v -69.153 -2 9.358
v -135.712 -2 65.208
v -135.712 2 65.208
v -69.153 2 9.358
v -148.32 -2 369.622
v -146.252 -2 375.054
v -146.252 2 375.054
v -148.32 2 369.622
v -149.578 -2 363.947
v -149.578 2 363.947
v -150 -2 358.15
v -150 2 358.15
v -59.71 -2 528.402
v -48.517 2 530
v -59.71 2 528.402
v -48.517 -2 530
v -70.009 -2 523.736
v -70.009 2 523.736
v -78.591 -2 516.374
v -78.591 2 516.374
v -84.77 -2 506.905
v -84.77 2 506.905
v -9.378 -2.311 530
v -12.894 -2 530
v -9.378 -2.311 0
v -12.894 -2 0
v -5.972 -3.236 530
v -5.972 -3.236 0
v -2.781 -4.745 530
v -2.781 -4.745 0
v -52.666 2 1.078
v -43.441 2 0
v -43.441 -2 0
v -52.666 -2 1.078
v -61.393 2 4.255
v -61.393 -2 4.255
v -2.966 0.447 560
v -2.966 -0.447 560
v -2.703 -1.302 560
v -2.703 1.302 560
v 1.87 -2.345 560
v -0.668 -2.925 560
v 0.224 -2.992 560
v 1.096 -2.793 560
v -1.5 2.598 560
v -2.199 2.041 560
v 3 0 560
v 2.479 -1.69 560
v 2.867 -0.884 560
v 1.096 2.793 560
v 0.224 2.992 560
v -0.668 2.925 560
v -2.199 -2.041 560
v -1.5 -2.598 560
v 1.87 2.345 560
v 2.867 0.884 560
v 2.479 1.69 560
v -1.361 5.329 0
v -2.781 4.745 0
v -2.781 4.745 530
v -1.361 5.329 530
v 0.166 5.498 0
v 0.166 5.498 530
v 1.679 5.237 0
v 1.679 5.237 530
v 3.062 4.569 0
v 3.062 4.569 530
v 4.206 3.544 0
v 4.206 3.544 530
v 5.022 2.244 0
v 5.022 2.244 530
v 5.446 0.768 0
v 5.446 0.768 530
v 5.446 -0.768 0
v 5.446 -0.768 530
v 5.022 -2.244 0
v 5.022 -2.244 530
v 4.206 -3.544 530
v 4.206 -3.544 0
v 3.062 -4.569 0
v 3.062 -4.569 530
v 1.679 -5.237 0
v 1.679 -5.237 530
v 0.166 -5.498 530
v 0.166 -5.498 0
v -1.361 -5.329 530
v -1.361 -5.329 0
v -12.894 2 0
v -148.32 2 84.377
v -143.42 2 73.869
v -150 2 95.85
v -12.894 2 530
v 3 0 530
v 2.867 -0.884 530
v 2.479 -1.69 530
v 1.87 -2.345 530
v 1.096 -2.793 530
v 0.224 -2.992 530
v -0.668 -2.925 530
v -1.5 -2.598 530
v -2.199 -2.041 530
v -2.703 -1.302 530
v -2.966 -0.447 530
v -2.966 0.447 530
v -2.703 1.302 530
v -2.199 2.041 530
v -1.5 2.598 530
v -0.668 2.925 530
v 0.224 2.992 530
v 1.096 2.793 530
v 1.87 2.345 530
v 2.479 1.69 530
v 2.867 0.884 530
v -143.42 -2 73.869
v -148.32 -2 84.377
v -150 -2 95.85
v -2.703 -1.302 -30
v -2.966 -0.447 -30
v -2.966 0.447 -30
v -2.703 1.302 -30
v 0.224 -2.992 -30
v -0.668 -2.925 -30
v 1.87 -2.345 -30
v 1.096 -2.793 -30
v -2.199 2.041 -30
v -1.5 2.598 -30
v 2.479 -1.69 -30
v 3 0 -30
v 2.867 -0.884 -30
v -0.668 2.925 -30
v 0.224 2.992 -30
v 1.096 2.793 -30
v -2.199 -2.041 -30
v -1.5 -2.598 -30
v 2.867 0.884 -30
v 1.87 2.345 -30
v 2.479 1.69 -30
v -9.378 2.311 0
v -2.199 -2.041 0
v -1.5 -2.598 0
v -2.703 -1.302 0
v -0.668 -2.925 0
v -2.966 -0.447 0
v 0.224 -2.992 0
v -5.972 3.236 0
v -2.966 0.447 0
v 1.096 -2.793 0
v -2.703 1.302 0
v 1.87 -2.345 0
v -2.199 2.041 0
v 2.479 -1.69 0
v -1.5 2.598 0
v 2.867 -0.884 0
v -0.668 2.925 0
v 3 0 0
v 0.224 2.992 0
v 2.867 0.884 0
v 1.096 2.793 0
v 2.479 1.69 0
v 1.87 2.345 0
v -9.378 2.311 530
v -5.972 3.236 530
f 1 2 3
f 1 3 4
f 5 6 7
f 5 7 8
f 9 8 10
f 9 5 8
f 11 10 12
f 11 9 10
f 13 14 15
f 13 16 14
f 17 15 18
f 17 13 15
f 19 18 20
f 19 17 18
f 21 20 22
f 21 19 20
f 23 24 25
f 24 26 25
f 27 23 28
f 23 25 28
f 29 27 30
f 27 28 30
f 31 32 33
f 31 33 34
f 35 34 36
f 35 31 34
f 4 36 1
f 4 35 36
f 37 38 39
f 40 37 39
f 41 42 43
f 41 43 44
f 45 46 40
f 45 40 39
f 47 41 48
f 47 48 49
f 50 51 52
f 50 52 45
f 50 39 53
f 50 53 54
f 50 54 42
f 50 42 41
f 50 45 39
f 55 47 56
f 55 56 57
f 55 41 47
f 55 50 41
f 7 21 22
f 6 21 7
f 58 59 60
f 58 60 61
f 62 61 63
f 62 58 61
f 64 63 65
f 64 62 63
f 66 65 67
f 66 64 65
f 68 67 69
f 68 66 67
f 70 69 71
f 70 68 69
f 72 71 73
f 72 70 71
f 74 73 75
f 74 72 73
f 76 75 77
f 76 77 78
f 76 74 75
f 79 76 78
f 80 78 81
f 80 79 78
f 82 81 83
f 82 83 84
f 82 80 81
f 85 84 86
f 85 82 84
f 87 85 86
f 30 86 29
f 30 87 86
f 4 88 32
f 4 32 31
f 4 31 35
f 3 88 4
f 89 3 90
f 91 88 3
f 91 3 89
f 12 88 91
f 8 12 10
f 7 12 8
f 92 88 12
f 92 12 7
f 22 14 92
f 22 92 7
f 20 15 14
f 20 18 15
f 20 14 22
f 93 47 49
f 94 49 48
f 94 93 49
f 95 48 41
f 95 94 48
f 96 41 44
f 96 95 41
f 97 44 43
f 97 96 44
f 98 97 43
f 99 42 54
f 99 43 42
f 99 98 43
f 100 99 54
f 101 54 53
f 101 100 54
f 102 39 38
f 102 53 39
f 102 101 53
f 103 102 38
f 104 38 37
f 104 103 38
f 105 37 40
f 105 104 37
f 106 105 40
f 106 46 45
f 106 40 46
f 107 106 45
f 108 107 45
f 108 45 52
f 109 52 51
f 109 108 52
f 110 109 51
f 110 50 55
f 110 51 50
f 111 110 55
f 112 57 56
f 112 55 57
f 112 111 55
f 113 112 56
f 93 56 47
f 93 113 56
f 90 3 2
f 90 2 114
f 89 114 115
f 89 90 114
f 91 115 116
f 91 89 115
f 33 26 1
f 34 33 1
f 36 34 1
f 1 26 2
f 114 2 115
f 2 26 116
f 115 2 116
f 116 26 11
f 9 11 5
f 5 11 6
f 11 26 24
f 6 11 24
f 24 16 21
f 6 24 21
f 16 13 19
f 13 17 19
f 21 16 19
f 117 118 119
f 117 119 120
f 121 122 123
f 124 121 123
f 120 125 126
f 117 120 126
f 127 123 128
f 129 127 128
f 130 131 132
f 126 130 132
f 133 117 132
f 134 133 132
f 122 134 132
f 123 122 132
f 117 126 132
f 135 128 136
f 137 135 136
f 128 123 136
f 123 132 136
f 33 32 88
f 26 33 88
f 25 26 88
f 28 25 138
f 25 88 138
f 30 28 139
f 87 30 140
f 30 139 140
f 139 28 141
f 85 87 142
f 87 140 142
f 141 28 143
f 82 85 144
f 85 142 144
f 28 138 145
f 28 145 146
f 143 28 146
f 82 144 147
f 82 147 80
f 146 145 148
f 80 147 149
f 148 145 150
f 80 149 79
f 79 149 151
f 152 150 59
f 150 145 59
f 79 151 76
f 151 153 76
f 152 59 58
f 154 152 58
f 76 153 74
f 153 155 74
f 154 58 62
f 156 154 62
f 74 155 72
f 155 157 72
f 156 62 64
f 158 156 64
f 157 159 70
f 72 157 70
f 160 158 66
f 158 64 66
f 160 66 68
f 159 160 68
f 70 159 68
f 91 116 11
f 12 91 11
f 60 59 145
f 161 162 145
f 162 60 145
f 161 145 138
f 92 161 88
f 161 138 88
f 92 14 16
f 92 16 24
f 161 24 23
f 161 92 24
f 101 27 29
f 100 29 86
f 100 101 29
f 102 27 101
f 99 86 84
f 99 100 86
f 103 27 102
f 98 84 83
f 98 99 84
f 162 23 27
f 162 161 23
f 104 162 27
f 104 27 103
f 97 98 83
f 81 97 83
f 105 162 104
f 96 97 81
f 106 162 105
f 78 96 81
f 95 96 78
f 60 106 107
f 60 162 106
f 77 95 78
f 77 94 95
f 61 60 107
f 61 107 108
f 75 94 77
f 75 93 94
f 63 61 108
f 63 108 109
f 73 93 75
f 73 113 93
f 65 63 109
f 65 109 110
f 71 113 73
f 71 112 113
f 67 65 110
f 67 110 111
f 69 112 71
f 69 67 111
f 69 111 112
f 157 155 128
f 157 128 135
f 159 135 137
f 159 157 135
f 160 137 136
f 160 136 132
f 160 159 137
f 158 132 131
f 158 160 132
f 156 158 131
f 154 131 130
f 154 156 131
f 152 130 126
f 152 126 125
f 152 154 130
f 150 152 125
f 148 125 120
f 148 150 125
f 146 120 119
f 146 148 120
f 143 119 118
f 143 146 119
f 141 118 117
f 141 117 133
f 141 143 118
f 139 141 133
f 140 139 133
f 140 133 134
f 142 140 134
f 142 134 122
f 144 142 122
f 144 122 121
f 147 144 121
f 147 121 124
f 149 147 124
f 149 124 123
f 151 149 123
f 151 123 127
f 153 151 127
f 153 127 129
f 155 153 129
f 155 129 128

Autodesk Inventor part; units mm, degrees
ref_plane "YZ Plane" through (0, 0, 0) normal (1, 0, 0) x (0, 1, 0)
ref_plane "XZ Plane" through (0, 0, 0) normal (0, 1, 0) x (-1, 0, 0)
ref_plane "XY Plane" through (0, 0, 0) normal (0, 0, 1) x (1, 0, 0)
sketch "Sketch1" plane through (0, 0, 0) normal (0, 0, 1) x (1, 0, 0)
  circle A0 centre (0, 0) radius 5.5
  circle A1 centre (0, 0) radius 3
  dimension "d0" = 11
  dimension "d1" = 6
extrude "tube" add sketch "Sketch1" along normal blind 530
sketch "Sketch2" plane through (0, 0, 0) normal (0, 1, 0) x (-1, 0, 0)
  line L0 (0, 0) -> (150, 0)
  line L1 (150, 0) -> (150, 530)
  line L2 (150, 530) -> (0, 530)
  line L3 (0, 530) -> (0, 0)
  line L4 (75, 0) -> (165.4178, 0) construction
  line L5 (74, 530) -> (150, 367.0175)
  line L6 (74, 530) -> (253.8313, 530) construction
  line L7 (150, 77.1972) -> (58, 0)
  point P0 (150, 333)
  dimension "d4" = 150
  dimension "d5" = 530
  dimension "d9" = 65
  dimension "d16" = 74
  dimension "d17" = 58
  dimension "d18" = 40
extrude "tail" add sketch "Sketch2" along normal mid plane 4 contours L3 L2 L5 L1 L7 L0
fillet "Fillet1" radius 40 4 edges at (-74, 0, 530) (-150, 0, 367.0175) (-150, 0, 77.1972) (-58, 0, 0)
fillet "Fillet2" radius 20 2 edges at (-5.1235, -2, 265) (-5.1235, 2, 265)
extrude "shaft" add sketch "Sketch1" along normal blind 560 and the other way blind 30 contours A1
equation "\"d2\" = tail_height"
equation "\"d5\" = tail_height"
equation "\"tail_height\" = 530"
properties part number "tail2"
